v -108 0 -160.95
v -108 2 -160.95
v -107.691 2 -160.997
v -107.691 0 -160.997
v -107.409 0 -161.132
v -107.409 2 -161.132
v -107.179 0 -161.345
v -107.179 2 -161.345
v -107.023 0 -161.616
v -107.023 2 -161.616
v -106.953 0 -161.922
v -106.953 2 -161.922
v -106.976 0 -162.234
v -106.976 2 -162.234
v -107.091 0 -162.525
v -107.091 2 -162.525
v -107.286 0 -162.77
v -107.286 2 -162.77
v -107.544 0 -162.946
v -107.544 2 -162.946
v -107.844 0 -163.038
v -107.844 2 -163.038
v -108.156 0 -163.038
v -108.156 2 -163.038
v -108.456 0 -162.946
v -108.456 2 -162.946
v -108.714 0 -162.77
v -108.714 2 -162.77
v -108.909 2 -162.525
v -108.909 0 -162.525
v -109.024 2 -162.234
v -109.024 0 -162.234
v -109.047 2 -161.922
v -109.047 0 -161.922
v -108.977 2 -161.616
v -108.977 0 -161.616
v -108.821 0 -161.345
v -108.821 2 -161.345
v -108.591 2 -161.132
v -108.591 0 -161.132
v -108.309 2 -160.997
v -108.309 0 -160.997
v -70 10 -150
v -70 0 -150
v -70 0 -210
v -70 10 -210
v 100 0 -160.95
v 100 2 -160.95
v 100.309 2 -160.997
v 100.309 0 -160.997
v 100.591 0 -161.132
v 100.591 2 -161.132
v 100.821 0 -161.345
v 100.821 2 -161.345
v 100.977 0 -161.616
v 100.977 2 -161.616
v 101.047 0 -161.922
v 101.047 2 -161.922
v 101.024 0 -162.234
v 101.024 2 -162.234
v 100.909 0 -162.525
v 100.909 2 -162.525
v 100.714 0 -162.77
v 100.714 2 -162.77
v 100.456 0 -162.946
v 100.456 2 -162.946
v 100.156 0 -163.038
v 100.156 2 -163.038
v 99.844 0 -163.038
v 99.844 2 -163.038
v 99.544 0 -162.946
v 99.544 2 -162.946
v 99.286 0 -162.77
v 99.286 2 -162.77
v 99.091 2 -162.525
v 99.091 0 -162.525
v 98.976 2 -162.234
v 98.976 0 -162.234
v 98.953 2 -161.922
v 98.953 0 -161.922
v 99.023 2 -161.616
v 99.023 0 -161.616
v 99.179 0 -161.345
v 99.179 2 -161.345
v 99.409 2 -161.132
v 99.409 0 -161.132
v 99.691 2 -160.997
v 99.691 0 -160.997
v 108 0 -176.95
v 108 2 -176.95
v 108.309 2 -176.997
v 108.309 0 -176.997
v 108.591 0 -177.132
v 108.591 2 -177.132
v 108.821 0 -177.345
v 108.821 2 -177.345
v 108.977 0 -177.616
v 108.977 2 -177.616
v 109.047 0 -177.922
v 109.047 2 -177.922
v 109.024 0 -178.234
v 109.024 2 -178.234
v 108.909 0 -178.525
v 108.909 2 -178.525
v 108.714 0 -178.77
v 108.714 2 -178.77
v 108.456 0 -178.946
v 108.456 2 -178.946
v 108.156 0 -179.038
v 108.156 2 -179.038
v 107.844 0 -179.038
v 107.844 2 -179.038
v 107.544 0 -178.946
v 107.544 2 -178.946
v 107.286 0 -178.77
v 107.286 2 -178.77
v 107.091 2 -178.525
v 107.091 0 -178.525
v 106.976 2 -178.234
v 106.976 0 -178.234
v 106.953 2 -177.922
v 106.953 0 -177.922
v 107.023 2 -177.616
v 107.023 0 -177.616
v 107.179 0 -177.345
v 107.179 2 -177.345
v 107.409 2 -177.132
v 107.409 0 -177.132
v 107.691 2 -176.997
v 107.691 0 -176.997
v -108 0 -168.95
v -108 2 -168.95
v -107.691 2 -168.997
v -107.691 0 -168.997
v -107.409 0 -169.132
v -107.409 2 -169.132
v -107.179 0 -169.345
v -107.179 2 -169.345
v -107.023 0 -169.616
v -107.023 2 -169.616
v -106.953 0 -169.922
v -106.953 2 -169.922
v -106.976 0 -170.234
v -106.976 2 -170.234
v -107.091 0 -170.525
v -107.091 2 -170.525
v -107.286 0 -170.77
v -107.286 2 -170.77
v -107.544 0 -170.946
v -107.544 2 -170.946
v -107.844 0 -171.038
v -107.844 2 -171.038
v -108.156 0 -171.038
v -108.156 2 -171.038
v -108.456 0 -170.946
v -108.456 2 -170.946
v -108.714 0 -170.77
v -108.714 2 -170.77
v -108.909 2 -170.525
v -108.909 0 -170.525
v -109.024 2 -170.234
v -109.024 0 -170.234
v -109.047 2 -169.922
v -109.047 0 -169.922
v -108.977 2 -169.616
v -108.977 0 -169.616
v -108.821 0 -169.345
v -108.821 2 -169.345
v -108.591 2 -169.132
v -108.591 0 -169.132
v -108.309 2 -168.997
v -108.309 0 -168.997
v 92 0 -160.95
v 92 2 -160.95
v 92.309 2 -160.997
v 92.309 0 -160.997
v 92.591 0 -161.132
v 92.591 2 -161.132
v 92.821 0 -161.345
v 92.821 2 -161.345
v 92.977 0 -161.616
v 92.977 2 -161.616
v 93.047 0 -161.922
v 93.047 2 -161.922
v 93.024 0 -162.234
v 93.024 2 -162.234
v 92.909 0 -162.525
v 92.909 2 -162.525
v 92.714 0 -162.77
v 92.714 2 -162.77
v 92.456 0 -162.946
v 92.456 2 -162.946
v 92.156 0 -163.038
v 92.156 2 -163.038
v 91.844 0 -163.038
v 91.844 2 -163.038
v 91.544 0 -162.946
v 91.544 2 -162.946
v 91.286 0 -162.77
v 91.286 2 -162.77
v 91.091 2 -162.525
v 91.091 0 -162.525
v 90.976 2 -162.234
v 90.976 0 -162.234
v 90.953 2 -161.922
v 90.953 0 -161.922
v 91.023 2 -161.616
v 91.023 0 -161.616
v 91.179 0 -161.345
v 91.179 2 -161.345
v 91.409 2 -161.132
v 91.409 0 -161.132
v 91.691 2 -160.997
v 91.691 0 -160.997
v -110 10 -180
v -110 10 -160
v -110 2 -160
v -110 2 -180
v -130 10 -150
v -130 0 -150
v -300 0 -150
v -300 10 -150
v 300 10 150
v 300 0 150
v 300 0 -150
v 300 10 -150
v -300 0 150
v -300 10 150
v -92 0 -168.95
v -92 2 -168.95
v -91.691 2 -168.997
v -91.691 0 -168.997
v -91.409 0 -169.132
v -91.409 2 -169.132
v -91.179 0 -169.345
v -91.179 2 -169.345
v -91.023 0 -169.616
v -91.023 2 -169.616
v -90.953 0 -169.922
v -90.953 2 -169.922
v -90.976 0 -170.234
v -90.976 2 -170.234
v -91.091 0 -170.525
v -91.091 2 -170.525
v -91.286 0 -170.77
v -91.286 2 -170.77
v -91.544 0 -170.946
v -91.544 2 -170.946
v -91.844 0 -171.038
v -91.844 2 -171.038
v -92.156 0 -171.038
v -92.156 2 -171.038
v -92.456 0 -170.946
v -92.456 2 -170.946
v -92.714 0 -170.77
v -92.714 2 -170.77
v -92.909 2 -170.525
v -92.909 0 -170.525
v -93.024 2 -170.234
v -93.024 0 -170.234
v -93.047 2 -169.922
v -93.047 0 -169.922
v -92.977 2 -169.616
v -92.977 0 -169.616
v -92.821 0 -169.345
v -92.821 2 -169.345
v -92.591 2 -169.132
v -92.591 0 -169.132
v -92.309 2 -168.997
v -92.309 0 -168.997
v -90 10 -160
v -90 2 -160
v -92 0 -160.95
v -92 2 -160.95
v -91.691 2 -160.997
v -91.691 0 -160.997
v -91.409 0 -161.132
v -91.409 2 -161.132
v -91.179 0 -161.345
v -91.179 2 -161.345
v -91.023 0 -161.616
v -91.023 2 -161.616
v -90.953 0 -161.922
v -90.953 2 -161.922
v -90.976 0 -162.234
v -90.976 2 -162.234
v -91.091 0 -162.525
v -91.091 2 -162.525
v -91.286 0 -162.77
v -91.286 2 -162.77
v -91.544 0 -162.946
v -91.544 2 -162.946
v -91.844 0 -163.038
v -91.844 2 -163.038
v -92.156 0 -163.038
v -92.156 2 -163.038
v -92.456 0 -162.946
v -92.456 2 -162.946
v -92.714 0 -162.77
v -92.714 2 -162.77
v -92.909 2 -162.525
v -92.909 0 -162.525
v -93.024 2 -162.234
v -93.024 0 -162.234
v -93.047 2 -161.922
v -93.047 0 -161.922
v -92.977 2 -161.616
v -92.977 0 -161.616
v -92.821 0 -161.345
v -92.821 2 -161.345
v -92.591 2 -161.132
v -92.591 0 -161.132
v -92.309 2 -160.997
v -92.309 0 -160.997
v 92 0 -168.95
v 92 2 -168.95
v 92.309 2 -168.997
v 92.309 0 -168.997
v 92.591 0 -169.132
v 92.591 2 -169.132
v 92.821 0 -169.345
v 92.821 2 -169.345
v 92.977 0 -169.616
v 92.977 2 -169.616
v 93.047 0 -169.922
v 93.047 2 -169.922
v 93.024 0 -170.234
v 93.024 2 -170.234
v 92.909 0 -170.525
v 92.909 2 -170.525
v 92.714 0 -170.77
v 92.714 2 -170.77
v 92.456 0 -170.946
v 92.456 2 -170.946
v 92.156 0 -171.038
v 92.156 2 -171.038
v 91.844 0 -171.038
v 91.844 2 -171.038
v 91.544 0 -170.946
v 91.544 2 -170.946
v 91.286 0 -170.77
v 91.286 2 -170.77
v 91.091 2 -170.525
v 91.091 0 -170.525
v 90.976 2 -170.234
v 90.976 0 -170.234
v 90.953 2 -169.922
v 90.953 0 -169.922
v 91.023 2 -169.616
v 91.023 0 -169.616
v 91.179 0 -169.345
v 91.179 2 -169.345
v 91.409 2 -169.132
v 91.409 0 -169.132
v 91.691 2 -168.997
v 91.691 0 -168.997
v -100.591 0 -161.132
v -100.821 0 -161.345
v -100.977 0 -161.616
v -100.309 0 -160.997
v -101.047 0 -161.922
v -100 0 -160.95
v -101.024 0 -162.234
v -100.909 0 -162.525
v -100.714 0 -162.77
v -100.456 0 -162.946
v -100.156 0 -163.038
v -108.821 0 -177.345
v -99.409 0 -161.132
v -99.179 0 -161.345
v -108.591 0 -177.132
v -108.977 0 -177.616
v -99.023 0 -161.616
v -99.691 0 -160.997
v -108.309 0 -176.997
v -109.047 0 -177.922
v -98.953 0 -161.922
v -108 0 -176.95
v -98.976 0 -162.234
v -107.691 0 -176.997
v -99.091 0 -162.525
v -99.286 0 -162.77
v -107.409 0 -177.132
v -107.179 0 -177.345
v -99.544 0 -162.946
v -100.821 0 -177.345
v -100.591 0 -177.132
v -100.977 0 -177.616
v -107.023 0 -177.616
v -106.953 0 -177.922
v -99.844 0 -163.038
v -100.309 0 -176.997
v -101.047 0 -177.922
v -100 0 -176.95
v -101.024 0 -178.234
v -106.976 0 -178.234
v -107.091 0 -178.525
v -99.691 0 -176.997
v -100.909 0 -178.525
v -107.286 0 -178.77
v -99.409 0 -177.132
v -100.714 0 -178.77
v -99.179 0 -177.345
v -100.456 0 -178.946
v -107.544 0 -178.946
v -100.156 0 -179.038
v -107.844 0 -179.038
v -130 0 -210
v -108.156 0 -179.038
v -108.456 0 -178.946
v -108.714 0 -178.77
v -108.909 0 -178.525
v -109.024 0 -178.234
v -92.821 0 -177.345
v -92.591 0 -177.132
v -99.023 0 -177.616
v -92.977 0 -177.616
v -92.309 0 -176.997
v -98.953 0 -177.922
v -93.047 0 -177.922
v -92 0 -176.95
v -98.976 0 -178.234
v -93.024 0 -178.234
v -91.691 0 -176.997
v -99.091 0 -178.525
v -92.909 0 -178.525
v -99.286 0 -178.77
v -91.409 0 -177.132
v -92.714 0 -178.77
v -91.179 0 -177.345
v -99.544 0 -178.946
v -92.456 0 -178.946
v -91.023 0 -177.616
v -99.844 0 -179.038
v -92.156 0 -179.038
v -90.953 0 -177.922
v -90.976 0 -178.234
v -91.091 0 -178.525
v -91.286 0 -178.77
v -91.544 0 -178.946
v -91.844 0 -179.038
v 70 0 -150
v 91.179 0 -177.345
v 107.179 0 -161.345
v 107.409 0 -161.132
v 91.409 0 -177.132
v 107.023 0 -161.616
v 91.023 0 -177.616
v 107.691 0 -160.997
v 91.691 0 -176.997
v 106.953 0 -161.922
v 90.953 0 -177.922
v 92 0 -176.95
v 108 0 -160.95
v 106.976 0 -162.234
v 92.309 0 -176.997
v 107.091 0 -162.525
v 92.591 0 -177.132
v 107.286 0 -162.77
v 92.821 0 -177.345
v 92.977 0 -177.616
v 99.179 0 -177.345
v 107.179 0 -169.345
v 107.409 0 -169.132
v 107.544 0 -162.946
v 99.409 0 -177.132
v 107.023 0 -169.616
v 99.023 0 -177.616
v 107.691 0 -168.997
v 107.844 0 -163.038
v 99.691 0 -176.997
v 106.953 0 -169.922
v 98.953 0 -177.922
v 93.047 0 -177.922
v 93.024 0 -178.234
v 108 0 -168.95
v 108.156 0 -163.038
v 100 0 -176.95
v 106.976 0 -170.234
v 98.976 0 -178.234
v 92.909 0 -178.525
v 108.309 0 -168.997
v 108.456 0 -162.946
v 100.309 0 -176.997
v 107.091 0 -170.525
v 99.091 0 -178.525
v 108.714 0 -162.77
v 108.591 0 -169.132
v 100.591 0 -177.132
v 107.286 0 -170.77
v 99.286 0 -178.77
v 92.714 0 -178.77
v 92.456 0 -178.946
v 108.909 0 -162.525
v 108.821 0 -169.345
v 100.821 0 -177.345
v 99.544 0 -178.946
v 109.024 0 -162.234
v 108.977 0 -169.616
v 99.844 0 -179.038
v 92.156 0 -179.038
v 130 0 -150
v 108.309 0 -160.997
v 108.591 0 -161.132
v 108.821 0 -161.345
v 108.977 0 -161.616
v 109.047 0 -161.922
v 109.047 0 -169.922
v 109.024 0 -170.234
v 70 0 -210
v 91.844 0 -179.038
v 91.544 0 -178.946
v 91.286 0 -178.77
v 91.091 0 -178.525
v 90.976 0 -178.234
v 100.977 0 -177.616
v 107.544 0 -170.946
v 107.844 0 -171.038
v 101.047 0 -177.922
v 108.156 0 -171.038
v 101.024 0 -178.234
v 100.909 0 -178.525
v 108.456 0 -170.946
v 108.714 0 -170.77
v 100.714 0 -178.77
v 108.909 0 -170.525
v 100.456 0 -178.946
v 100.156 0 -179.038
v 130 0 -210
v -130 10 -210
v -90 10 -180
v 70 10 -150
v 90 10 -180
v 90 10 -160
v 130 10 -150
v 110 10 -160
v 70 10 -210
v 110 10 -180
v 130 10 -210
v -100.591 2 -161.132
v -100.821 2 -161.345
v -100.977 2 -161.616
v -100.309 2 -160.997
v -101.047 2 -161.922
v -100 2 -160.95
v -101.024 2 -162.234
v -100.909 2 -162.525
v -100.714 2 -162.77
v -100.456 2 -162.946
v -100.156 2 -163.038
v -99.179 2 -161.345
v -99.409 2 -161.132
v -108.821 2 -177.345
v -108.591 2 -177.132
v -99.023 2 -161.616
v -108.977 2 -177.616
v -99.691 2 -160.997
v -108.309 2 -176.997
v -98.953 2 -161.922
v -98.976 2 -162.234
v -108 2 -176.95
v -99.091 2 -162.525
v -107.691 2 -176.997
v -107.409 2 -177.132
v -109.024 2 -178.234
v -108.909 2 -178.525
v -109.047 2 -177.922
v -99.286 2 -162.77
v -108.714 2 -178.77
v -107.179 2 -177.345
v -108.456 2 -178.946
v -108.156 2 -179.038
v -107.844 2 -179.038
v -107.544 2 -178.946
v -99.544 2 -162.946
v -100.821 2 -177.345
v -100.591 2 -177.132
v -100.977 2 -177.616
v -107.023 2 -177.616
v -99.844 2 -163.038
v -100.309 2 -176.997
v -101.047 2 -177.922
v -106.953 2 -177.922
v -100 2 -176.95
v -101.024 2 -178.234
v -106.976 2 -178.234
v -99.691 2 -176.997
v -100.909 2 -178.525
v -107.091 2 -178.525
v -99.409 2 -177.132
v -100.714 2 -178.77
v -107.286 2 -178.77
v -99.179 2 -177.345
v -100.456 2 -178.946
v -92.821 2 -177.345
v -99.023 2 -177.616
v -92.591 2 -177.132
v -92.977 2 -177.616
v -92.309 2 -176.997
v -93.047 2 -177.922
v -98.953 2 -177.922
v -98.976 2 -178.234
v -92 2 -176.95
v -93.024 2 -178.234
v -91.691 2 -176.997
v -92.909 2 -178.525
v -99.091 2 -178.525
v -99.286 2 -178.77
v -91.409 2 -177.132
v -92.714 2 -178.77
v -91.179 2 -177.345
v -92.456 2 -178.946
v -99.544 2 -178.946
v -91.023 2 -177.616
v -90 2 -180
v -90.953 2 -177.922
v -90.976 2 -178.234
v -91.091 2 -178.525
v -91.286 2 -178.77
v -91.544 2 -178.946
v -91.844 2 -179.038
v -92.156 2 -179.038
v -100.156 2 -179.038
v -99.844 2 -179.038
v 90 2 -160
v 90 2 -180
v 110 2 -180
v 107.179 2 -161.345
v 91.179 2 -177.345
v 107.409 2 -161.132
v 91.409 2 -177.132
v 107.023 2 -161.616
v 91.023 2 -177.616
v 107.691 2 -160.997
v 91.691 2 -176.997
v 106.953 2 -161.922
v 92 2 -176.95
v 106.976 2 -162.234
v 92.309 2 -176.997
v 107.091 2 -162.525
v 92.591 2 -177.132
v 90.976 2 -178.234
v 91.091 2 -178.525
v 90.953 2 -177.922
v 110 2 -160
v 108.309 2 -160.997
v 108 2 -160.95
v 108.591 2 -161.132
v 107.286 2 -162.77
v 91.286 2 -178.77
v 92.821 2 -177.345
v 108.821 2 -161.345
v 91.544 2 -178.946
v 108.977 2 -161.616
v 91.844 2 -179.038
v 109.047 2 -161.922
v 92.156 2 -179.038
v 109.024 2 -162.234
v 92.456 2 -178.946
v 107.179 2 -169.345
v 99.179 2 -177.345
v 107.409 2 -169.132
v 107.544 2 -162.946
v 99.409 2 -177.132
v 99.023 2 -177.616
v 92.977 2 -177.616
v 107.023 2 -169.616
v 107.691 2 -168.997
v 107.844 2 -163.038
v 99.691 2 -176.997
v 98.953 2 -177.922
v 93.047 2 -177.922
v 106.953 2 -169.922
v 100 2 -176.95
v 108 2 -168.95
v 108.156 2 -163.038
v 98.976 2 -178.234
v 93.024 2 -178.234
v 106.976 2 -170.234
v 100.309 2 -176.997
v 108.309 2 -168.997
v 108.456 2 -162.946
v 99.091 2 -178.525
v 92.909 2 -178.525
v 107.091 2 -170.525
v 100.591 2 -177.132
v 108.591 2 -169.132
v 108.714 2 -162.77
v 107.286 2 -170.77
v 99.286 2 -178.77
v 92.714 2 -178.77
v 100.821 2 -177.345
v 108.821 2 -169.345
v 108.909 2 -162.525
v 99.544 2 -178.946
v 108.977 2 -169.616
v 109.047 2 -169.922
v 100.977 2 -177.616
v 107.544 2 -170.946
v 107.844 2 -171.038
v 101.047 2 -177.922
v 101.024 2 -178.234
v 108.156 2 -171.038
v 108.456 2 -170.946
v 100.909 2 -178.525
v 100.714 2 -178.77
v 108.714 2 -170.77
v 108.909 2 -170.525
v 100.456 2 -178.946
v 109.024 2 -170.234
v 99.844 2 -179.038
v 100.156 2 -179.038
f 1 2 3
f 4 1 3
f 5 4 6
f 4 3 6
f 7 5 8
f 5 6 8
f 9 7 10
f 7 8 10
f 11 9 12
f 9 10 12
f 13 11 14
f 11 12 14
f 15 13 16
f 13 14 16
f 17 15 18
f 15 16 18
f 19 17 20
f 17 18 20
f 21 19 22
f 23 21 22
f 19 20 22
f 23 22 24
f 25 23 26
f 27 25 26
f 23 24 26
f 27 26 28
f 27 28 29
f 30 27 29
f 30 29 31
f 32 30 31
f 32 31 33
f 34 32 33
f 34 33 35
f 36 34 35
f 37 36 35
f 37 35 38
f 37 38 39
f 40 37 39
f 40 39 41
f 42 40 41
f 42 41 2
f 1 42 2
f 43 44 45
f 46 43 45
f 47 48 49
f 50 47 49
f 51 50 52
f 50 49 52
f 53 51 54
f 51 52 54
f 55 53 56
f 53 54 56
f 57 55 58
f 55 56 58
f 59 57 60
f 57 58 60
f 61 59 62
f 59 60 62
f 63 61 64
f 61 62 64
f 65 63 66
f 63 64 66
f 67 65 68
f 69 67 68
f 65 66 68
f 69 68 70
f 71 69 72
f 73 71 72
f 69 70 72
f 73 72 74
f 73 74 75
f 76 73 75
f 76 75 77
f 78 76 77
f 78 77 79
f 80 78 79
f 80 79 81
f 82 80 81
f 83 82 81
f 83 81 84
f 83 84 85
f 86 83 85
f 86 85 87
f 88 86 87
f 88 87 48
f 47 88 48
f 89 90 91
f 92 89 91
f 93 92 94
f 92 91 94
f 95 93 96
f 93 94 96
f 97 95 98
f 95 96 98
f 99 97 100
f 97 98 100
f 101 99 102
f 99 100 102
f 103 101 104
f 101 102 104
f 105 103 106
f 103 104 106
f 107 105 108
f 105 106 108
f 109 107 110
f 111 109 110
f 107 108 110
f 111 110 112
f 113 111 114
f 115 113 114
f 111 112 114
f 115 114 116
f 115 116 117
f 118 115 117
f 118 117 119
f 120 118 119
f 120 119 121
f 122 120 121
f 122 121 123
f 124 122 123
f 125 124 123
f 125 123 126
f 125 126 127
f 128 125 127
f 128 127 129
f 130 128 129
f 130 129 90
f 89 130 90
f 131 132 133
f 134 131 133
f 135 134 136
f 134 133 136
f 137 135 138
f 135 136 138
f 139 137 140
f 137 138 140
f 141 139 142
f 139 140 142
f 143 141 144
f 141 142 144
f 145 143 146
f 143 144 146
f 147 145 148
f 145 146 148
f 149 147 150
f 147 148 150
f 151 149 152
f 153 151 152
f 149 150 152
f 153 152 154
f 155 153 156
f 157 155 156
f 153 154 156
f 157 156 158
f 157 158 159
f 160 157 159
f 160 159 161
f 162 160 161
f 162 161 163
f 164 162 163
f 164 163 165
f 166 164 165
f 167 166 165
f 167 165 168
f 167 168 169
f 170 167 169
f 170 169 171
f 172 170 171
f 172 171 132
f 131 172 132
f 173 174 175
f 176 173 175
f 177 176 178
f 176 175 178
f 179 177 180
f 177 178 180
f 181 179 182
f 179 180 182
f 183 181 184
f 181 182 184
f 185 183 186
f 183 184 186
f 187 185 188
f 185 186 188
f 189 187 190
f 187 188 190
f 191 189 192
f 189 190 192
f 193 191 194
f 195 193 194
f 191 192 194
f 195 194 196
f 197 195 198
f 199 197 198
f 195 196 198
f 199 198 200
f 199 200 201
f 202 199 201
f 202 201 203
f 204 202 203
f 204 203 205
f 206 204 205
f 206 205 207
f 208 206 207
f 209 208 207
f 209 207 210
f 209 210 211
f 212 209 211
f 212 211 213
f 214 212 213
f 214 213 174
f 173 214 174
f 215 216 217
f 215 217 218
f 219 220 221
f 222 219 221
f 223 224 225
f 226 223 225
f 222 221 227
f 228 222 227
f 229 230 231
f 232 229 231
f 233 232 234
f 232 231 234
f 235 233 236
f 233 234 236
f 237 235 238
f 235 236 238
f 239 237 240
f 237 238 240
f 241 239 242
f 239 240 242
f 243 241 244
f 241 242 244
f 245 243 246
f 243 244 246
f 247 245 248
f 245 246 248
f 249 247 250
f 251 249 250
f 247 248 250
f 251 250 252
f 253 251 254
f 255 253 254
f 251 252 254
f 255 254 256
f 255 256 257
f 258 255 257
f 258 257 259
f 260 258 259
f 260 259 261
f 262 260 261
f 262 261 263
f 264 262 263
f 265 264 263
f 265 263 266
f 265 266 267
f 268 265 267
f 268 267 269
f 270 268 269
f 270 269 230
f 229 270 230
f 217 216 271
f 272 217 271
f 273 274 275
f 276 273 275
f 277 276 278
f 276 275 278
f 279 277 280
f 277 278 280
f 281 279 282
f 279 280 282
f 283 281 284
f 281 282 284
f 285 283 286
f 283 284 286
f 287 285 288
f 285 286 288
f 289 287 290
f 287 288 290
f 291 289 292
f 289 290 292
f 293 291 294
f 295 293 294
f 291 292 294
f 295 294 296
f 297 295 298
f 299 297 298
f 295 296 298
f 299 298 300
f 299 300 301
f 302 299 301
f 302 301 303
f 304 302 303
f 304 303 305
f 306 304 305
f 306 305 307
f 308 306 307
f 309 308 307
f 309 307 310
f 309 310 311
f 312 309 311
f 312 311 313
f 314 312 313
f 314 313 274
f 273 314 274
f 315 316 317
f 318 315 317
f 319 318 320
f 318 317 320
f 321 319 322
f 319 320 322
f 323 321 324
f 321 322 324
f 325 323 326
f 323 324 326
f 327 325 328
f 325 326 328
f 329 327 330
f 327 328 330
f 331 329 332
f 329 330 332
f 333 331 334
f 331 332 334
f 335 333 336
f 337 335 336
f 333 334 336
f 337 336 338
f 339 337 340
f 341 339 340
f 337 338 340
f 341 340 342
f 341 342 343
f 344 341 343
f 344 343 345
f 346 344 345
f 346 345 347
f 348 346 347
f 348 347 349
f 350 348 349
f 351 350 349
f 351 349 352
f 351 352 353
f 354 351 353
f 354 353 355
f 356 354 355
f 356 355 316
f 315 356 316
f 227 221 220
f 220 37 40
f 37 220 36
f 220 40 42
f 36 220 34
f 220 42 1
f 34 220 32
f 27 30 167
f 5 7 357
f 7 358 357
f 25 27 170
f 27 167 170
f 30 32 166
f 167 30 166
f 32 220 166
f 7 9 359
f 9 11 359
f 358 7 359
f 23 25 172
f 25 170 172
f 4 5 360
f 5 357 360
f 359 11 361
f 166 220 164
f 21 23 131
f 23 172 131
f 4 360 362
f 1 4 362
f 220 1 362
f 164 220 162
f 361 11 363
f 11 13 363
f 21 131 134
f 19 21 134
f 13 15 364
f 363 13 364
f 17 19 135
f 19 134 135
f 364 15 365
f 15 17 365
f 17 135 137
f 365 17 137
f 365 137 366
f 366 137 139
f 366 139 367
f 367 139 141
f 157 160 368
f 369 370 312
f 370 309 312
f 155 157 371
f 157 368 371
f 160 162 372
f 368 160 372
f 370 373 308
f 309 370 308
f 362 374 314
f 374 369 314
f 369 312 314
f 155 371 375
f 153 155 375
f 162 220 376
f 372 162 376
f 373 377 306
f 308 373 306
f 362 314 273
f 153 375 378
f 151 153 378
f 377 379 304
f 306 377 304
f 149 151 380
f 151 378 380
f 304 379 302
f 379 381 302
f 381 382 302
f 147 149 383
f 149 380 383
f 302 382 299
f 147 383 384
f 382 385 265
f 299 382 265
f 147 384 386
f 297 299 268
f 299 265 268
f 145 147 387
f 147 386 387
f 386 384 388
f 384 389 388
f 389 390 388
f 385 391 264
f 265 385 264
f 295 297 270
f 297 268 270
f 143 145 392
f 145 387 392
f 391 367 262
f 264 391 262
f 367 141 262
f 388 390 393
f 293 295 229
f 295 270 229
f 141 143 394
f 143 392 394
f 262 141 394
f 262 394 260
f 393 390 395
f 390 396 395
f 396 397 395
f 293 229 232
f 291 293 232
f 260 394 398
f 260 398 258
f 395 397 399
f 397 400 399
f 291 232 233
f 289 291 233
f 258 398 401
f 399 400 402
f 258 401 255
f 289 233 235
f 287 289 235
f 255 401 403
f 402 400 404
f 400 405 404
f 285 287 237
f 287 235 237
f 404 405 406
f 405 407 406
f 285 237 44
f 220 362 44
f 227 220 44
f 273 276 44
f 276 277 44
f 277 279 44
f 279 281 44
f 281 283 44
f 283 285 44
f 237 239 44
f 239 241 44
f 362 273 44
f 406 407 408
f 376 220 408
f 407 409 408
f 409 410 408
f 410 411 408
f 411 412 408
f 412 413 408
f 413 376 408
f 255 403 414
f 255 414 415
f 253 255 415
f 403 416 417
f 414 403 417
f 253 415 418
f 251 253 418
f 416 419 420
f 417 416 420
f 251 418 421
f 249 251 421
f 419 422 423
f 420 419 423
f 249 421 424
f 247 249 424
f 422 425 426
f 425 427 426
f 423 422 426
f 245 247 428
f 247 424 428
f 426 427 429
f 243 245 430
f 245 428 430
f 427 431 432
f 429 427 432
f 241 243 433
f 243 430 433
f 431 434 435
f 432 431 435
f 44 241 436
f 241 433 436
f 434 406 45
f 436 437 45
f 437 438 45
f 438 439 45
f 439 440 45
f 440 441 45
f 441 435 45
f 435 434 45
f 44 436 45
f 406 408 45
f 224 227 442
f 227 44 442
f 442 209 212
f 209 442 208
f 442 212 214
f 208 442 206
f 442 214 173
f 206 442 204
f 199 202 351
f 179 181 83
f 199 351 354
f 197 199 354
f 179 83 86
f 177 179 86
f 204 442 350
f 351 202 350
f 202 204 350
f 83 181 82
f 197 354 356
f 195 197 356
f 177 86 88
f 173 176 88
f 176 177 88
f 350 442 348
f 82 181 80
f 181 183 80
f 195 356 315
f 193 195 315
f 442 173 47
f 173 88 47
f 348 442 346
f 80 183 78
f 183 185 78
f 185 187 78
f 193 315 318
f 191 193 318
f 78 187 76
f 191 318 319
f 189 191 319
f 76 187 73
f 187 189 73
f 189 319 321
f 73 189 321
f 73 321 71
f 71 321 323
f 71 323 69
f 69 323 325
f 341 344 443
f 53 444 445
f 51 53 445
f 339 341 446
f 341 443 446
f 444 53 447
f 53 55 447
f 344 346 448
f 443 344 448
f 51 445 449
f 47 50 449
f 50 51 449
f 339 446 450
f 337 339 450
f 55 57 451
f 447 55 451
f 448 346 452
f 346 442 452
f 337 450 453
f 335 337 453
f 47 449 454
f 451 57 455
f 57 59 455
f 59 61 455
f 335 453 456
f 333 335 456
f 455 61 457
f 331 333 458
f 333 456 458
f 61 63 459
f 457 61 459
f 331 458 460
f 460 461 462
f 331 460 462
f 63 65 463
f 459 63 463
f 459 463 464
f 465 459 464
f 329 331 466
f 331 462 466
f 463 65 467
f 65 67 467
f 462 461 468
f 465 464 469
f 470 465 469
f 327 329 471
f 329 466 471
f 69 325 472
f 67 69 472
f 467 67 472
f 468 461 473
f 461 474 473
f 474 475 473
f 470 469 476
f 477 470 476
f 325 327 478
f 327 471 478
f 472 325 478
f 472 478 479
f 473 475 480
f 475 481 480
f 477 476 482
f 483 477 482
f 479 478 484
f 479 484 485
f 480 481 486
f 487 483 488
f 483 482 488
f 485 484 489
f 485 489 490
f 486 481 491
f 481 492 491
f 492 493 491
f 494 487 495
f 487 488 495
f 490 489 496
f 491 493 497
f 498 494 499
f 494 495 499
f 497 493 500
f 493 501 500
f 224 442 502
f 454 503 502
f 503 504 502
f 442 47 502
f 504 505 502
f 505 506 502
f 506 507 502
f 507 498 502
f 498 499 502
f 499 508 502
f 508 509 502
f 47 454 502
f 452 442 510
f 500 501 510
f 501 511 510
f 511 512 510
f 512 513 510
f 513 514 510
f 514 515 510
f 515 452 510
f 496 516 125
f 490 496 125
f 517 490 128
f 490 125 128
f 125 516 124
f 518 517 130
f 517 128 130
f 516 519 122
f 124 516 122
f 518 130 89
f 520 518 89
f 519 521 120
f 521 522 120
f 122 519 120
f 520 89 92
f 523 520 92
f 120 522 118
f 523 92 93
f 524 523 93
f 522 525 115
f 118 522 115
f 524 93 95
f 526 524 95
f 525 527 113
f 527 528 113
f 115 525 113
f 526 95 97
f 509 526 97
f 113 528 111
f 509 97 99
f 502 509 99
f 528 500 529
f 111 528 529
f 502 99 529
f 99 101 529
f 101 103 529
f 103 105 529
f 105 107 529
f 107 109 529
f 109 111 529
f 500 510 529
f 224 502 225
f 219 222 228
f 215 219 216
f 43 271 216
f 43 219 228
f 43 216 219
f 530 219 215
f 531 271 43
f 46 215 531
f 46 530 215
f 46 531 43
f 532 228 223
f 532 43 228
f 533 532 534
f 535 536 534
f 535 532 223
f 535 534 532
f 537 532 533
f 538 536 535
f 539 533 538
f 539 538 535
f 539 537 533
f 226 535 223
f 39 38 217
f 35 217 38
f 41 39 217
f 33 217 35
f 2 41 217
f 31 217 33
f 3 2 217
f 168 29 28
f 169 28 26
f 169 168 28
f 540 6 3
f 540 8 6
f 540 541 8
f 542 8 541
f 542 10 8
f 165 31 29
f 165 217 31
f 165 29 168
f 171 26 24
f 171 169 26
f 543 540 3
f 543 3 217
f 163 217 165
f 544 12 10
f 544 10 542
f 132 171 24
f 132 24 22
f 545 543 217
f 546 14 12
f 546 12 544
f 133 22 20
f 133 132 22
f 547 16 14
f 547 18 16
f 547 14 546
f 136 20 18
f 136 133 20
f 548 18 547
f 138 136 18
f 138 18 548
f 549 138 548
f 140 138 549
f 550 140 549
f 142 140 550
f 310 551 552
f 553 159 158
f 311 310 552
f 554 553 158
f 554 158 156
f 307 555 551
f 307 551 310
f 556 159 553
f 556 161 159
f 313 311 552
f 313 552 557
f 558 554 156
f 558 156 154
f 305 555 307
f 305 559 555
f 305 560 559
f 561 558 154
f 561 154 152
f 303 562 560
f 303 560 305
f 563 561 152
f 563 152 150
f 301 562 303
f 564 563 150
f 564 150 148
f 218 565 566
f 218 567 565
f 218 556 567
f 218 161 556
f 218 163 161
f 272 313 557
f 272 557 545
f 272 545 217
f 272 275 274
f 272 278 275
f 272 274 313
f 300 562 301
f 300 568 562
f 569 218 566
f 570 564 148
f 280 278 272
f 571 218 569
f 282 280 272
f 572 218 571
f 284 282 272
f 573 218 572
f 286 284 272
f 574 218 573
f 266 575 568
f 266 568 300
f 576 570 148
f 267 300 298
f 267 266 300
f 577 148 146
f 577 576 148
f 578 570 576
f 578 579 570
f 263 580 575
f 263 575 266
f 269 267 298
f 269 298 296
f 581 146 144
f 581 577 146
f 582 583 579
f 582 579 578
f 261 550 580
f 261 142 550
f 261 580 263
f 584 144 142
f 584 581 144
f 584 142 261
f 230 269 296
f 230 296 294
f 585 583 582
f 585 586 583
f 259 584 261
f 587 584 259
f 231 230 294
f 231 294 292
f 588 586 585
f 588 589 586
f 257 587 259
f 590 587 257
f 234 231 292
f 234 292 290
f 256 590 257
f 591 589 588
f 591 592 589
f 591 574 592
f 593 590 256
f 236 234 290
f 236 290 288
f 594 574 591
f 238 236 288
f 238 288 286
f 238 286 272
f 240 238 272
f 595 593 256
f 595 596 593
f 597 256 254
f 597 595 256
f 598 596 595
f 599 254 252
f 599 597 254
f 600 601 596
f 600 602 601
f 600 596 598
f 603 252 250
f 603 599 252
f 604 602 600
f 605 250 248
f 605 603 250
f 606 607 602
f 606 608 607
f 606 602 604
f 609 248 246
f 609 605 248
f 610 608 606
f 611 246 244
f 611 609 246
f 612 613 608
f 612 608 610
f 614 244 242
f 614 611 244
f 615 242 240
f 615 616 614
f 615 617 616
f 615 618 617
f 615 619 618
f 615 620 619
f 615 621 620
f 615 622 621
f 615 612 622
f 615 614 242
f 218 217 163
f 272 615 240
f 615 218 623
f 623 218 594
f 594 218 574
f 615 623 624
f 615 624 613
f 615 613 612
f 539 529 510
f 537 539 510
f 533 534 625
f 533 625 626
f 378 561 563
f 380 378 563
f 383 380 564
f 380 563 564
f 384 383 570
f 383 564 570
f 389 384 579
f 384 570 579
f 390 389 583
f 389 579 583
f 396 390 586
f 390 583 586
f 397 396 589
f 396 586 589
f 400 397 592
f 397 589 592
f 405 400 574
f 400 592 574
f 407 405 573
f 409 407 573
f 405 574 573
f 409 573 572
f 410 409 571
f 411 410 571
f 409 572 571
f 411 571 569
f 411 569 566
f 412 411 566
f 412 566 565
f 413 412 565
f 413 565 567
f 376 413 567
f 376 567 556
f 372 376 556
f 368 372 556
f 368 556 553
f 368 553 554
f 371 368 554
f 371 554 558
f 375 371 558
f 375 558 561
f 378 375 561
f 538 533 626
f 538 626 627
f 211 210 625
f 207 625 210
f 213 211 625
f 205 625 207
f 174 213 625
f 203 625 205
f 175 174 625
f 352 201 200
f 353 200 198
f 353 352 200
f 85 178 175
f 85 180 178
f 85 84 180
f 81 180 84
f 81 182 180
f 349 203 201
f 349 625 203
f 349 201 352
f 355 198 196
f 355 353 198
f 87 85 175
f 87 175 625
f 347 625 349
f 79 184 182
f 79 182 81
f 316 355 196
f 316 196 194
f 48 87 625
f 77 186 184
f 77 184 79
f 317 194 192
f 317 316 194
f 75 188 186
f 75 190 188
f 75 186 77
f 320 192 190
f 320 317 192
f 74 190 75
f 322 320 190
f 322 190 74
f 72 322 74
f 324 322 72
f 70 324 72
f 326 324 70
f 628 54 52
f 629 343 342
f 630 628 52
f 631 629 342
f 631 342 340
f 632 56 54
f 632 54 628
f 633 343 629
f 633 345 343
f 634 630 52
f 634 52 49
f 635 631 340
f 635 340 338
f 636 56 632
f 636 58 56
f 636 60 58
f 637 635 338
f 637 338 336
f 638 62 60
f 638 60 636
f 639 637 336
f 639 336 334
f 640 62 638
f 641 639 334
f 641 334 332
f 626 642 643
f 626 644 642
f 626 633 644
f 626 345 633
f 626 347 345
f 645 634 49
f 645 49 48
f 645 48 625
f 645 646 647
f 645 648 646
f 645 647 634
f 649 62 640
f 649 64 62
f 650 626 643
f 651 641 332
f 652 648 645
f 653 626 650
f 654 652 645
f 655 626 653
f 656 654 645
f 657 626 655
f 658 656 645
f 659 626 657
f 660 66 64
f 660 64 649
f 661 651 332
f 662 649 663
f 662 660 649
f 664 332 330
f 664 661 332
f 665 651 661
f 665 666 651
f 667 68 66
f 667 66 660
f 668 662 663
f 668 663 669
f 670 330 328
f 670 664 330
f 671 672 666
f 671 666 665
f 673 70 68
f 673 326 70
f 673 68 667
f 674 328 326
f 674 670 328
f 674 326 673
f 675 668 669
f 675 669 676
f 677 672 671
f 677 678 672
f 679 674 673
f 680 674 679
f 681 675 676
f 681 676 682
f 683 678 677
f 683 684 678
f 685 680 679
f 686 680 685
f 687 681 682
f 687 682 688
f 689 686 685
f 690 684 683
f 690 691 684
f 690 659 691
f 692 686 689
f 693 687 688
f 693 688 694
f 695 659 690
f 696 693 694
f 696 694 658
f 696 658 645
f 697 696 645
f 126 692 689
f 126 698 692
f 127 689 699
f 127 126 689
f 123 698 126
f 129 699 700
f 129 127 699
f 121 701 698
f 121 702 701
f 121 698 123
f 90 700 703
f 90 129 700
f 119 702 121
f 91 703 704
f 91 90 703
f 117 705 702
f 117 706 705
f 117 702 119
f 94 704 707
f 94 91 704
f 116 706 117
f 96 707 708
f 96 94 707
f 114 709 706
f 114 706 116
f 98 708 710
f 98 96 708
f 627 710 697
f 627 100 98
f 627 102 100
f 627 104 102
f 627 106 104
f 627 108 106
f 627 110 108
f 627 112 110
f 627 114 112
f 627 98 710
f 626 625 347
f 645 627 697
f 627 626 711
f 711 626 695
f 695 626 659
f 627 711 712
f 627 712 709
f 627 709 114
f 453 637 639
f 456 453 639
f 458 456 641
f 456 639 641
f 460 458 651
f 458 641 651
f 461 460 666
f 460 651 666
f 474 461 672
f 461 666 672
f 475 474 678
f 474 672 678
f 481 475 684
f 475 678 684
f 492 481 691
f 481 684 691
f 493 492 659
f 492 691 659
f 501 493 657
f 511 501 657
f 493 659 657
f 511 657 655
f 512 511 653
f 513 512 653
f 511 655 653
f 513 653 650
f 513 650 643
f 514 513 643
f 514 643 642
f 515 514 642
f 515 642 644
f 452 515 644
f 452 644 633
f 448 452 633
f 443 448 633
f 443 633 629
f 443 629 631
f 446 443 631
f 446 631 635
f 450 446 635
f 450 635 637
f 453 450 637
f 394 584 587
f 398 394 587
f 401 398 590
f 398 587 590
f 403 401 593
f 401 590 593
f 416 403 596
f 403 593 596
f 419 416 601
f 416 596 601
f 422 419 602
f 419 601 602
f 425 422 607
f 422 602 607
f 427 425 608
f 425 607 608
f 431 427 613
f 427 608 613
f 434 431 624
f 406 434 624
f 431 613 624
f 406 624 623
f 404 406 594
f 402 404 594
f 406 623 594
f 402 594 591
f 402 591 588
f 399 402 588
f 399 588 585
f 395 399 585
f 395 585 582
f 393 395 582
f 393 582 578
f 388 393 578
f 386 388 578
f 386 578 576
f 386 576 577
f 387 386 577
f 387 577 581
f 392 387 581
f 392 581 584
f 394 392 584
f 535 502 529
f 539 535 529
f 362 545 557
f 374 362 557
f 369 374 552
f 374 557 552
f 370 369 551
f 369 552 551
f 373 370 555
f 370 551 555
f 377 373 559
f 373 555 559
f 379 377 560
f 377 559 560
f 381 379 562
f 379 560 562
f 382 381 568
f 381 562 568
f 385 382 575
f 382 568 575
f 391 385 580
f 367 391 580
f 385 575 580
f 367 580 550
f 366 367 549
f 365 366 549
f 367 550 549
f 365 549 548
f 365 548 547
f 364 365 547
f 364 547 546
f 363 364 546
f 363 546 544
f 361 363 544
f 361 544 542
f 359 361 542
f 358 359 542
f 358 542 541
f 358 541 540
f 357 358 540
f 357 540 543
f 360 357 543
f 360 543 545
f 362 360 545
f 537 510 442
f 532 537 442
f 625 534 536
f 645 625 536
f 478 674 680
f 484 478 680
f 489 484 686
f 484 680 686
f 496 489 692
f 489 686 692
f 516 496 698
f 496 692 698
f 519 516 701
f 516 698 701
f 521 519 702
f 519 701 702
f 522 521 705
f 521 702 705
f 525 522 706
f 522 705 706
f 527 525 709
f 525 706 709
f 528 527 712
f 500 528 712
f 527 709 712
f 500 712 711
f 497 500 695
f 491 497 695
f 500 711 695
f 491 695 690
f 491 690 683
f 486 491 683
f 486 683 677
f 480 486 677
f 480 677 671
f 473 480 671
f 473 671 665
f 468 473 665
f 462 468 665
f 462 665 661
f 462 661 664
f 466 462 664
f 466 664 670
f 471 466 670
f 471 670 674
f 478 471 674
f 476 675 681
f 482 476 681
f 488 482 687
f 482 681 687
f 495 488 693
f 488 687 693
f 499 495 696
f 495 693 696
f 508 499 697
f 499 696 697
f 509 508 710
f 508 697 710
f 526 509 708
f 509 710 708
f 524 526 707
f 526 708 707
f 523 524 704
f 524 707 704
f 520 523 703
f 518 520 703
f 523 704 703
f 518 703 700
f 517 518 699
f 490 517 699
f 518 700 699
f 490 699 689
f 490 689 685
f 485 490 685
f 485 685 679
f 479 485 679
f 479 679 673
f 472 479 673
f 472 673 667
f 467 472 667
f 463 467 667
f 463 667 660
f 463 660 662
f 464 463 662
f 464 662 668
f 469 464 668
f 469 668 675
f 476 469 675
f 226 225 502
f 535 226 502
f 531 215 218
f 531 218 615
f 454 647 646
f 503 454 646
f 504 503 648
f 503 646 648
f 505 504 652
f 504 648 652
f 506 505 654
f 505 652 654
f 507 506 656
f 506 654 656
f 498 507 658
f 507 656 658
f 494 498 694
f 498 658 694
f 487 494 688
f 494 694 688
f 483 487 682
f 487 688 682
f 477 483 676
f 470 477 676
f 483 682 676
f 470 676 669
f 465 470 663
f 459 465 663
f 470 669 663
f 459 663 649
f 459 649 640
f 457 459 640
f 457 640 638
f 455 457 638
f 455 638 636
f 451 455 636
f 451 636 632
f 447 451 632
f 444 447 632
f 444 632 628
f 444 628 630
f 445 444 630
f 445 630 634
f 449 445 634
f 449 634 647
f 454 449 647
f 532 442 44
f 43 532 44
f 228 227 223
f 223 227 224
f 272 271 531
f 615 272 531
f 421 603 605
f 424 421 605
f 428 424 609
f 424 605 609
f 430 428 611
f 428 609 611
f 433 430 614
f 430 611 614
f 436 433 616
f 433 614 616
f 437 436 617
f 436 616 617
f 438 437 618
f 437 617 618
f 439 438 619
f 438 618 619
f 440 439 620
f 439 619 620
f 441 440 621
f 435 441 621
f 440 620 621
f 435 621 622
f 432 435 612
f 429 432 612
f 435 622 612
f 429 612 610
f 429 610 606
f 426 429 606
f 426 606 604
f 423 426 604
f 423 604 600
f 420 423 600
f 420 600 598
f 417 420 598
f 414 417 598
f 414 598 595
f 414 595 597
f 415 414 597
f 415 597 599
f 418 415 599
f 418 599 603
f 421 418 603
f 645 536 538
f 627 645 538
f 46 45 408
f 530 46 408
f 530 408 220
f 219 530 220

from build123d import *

# Parameters (mm, degrees)
EXTRUDE_1_DEPTH     = 10
SKETCH_2_W          = 20
SKETCH_2_H          = 20
SKETCH_2_R          = 1.05
CUT_EXTRUDE_1_DEPTH = 8
SKETCH_2_4_R        = 1.05
CUT_EXTRUDE_3_DEPTH = 367.33318168


with BuildPart() as part:
    # 草圖1 → 填料-伸長1 (new body)
    with BuildSketch(Plane(origin=(0, 0, 0), x_dir=(1, 0, 0), z_dir=(0, 1, 0))):
        Polygon((-300, -150), (300, -150), (300, 150), (130, 150), (130, 210), (70, 210), (70, 150), (-70, 150), (-70, 210), (-130, 210), (-130, 150), (-300, 150), align=None)
    extrude(amount=EXTRUDE_1_DEPTH)

    # 草圖2 → 除料-伸長1 (cut)
    # profile 1 of 2: a face of its own
    with BuildSketch(Plane(origin=(0, 10, 0), x_dir=(1, 0, 0), z_dir=(0, 1, 0))):
        with Locations((-100, 170)):
            Rectangle(SKETCH_2_W, SKETCH_2_H)
        with Locations((-108, 162)):
            Circle(SKETCH_2_R, mode=Mode.SUBTRACT)
        with Locations((-100, 162)):
            Circle(SKETCH_2_R, mode=Mode.SUBTRACT)
        with Locations((-92, 162)):
            Circle(SKETCH_2_R, mode=Mode.SUBTRACT)
        with Locations((-108, 170)):
            Circle(SKETCH_2_R, mode=Mode.SUBTRACT)
        with Locations((-92, 170)):
            Circle(SKETCH_2_R, mode=Mode.SUBTRACT)
        with Locations((-108, 178)):
            Circle(SKETCH_2_R, mode=Mode.SUBTRACT)
        with Locations((-100, 178)):
            Circle(SKETCH_2_R, mode=Mode.SUBTRACT)
        with Locations((-92, 178)):
            Circle(SKETCH_2_R, mode=Mode.SUBTRACT)
    # profile 2 of 2: a face of its own
    with BuildSketch(Plane(origin=(0, 10, 0), x_dir=(1, 0, 0), z_dir=(0, 1, 0))):
        with Locations((100, 170)):
            Rectangle(SKETCH_2_W, SKETCH_2_H)
        with Locations((92, 162)):
            Circle(SKETCH_2_R, mode=Mode.SUBTRACT)
        with Locations((100, 162)):
            Circle(SKETCH_2_R, mode=Mode.SUBTRACT)
        with Locations((108, 162)):
            Circle(SKETCH_2_R, mode=Mode.SUBTRACT)
        with Locations((92, 170)):
            Circle(SKETCH_2_R, mode=Mode.SUBTRACT)
        with Locations((108, 170)):
            Circle(SKETCH_2_R, mode=Mode.SUBTRACT)
        with Locations((92, 178)):
            Circle(SKETCH_2_R, mode=Mode.SUBTRACT)
        with Locations((100, 178)):
            Circle(SKETCH_2_R, mode=Mode.SUBTRACT)
        with Locations((108, 178)):
            Circle(SKETCH_2_R, mode=Mode.SUBTRACT)
    extrude(amount=-CUT_EXTRUDE_1_DEPTH, mode=Mode.SUBTRACT)

    # 草圖2<4> → 除料-伸長3 (cut, through all)
    with BuildSketch(Plane(origin=(0, 10, 0), x_dir=(1, 0, 0), z_dir=(0, 1, 0))):
        with Locations((-108, 178)):
            Circle(SKETCH_2_4_R)
        with Locations((-92, 178)):
            Circle(SKETCH_2_4_R)
        with Locations((-92, 162)):
            Circle(SKETCH_2_4_R)
        with Locations((-108, 162)):
            Circle(SKETCH_2_4_R)
        with Locations((108, 162)):
            Circle(SKETCH_2_4_R)
        with Locations((92, 162)):
            Circle(SKETCH_2_4_R)
        with Locations((92, 178)):
            Circle(SKETCH_2_4_R)
        with Locations((108, 178)):
            Circle(SKETCH_2_4_R)
        with Locations((-100, 178)):
            Circle(SKETCH_2_4_R)
        with Locations((-100, 162)):
            Circle(SKETCH_2_4_R)
        with Locations((-108, 170)):
            Circle(SKETCH_2_4_R)
        with Locations((-92, 170)):
            Circle(SKETCH_2_4_R)
        with Locations((108, 170)):
            Circle(SKETCH_2_4_R)
        with Locations((100, 162)):
            Circle(SKETCH_2_4_R)
        with Locations((92, 170)):
            Circle(SKETCH_2_4_R)
        with Locations((100, 178)):
            Circle(SKETCH_2_4_R)
    extrude(amount=-CUT_EXTRUDE_3_DEPTH, mode=Mode.SUBTRACT)


solid = part.part
